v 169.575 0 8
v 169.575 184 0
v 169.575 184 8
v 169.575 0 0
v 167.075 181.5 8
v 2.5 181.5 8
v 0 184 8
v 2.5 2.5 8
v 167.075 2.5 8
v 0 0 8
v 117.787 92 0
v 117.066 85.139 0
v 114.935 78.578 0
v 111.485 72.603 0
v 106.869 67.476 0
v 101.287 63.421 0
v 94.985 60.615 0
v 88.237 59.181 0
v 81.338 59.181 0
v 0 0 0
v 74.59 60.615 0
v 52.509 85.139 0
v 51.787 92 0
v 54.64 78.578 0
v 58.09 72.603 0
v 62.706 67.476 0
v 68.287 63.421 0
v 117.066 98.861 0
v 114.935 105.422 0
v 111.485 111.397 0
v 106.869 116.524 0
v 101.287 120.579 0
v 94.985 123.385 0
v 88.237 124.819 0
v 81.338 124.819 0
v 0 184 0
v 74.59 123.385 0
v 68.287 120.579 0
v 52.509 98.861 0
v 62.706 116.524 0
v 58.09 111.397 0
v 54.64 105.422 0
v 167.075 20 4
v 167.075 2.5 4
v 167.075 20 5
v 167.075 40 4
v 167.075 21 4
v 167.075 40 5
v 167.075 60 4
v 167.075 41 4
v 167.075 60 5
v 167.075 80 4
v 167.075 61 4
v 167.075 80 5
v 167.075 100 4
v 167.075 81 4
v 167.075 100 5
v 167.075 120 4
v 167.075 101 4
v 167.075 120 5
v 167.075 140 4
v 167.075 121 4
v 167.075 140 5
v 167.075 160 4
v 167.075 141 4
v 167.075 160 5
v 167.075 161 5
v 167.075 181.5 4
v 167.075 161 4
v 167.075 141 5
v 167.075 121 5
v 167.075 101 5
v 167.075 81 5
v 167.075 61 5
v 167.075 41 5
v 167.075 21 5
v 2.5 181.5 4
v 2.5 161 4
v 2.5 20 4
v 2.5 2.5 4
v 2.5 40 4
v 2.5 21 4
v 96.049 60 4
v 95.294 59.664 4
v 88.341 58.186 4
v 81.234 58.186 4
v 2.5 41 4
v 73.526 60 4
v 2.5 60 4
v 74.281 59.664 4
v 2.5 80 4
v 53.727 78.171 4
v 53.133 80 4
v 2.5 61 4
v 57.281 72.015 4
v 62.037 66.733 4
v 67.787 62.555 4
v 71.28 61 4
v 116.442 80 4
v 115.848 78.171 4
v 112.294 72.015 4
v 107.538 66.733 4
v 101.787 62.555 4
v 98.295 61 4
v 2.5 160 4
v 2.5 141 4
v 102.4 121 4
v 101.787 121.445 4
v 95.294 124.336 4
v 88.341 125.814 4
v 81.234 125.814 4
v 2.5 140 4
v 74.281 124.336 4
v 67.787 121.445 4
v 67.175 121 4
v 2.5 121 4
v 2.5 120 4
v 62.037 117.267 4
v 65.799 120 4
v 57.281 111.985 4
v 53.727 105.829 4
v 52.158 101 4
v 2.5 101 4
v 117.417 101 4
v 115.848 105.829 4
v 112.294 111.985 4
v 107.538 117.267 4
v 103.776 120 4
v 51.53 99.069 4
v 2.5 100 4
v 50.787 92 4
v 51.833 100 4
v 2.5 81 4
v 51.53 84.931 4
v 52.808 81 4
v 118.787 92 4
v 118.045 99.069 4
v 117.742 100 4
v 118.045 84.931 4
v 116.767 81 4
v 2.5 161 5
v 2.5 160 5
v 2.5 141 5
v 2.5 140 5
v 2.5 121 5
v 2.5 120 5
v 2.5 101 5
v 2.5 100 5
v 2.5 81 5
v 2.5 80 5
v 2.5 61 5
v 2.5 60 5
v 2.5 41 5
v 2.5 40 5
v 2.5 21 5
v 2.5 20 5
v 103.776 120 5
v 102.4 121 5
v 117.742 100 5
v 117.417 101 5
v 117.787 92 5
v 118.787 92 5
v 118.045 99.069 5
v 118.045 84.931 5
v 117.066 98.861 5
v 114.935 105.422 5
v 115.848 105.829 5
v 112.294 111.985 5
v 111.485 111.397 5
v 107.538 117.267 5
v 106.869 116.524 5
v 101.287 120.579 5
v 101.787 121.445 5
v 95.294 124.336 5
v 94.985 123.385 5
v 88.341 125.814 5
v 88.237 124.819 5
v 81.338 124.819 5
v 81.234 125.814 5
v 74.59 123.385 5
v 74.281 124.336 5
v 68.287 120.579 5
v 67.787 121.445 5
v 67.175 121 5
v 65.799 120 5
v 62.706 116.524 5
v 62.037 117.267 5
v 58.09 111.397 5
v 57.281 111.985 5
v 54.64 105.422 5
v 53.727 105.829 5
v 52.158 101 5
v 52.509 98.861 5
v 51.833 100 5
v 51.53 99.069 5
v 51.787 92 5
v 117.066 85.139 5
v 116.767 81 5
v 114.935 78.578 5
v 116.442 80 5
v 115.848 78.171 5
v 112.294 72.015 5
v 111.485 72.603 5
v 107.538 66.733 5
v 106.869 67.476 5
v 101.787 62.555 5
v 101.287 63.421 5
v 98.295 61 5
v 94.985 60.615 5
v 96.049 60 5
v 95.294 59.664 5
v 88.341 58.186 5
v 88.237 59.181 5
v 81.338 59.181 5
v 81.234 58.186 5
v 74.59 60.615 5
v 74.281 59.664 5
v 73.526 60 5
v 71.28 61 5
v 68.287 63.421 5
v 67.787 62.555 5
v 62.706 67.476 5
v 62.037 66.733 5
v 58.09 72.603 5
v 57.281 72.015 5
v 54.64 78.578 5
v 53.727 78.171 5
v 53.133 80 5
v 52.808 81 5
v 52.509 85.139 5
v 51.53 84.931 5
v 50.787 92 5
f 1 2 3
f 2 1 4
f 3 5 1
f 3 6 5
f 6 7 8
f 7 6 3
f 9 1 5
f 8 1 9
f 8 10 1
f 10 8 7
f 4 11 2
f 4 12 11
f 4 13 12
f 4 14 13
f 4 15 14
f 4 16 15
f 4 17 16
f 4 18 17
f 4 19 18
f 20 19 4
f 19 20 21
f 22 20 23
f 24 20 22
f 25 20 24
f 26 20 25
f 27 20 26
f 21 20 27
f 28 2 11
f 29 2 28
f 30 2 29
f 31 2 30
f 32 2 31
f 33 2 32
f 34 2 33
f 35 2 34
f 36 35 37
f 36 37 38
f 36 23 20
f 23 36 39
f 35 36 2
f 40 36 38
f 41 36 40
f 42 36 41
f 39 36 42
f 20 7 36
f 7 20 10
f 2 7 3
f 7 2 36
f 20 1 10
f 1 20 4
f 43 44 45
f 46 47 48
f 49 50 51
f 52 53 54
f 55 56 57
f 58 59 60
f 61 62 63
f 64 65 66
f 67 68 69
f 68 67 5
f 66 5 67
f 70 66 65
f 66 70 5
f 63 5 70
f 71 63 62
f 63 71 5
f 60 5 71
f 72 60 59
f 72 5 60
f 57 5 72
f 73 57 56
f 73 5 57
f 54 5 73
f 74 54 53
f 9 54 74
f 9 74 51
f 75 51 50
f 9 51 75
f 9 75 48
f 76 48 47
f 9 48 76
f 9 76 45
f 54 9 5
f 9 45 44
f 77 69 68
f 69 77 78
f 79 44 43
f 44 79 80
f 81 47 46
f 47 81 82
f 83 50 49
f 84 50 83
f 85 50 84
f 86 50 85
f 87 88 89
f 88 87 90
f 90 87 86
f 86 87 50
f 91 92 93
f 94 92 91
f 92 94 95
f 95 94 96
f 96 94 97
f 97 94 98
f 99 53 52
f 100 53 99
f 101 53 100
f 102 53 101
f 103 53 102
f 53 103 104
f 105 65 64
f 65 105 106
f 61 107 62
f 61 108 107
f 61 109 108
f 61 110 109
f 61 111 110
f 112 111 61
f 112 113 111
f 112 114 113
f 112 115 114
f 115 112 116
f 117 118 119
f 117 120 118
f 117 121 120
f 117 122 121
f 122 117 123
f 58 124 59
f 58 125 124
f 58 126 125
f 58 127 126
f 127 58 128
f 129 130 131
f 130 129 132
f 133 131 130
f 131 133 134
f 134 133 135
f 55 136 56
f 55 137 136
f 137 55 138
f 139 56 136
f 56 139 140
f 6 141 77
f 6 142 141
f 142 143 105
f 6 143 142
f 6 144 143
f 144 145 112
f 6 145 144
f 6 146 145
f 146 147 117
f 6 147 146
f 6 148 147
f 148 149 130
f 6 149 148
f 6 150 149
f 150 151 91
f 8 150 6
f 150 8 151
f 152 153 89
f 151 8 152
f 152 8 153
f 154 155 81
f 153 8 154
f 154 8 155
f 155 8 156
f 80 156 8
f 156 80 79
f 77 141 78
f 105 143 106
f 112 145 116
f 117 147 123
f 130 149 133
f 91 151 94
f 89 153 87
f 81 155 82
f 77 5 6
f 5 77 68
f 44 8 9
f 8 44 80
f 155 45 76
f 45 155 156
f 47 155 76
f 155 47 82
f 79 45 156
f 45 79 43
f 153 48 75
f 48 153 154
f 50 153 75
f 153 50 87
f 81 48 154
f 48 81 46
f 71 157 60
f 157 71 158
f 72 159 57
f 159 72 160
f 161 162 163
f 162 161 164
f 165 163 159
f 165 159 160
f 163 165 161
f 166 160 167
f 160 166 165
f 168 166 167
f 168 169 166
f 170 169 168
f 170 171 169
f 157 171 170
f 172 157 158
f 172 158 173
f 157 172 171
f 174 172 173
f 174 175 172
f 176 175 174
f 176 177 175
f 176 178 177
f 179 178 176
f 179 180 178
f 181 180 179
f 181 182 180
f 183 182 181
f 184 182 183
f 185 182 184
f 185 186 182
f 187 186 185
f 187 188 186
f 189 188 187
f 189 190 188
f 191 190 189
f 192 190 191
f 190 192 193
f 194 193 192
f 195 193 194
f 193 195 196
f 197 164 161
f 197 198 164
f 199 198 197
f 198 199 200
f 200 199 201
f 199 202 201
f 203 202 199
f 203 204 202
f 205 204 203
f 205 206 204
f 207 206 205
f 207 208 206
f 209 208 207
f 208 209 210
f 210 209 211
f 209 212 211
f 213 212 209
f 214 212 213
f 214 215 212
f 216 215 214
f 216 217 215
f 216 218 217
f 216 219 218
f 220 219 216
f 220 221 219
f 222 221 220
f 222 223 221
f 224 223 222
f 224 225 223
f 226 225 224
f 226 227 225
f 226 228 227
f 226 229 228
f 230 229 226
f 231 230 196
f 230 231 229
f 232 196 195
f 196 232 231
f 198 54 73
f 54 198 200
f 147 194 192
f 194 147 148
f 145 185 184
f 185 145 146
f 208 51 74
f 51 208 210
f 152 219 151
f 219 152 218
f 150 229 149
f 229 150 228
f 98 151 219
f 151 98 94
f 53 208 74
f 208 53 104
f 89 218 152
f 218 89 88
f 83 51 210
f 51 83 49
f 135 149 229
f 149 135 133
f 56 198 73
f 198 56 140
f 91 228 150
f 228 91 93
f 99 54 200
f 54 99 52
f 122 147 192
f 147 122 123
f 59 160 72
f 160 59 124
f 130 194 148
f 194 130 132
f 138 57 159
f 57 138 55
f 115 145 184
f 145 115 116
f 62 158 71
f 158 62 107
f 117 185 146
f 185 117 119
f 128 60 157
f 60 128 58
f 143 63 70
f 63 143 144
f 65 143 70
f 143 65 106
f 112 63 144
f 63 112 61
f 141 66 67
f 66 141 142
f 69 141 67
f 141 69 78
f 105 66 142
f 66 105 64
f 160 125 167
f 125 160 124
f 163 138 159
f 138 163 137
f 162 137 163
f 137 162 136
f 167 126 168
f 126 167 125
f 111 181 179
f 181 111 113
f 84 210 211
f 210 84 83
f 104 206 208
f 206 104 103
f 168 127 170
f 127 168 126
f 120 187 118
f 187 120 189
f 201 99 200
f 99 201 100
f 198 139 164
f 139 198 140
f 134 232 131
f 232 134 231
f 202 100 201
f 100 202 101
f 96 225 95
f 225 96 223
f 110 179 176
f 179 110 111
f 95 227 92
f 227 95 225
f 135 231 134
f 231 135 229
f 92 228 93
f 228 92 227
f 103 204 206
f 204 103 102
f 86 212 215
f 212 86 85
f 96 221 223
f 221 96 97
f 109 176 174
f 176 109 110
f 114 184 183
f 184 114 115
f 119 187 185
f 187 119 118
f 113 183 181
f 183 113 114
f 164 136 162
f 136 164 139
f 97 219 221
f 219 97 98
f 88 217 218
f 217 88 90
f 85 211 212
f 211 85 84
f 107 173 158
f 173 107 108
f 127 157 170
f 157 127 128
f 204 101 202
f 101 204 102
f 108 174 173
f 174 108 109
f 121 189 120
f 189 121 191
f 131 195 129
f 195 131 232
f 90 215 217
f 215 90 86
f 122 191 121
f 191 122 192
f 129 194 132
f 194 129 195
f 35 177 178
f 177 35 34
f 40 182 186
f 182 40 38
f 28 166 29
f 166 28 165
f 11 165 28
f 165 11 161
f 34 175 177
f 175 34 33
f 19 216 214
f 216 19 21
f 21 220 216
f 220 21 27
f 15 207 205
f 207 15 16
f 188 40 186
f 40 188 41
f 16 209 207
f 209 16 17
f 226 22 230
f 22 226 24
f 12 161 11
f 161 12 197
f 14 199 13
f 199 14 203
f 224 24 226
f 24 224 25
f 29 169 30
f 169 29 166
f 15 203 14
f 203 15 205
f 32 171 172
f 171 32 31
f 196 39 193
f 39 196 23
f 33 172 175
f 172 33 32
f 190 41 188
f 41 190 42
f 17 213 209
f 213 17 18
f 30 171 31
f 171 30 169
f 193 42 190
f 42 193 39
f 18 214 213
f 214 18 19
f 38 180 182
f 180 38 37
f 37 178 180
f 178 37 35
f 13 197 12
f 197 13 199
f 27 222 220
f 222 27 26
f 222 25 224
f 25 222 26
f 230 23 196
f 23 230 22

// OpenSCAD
// use the same width and depth as with the bee box

width = 146.575; 
depth = 179;
height = 8;

difference() {
union() {
lid_with_ribs();
color("lightseagreen") translate([(width+18+5)/2,(depth+5)/2,0]) cylinder(d=68,h=5);
}
    color("seagreen") translate([(width+18+5)/2,(depth+5)/2,0]) cylinder(d=66,h=5);
}
module lid_with_ribs() {
difference() {
cube([width+18+5,depth+5,height]);
color("green") translate([2.5,2.5,4]) cube([width+18,depth,height]);
}
ribs();
}

module ribs(l=179) {
    for(i = [20 : 20 : l]) {
        
        translate([0,i,4]) cube([146.575+18+4,1,1]);
        
    }
}
